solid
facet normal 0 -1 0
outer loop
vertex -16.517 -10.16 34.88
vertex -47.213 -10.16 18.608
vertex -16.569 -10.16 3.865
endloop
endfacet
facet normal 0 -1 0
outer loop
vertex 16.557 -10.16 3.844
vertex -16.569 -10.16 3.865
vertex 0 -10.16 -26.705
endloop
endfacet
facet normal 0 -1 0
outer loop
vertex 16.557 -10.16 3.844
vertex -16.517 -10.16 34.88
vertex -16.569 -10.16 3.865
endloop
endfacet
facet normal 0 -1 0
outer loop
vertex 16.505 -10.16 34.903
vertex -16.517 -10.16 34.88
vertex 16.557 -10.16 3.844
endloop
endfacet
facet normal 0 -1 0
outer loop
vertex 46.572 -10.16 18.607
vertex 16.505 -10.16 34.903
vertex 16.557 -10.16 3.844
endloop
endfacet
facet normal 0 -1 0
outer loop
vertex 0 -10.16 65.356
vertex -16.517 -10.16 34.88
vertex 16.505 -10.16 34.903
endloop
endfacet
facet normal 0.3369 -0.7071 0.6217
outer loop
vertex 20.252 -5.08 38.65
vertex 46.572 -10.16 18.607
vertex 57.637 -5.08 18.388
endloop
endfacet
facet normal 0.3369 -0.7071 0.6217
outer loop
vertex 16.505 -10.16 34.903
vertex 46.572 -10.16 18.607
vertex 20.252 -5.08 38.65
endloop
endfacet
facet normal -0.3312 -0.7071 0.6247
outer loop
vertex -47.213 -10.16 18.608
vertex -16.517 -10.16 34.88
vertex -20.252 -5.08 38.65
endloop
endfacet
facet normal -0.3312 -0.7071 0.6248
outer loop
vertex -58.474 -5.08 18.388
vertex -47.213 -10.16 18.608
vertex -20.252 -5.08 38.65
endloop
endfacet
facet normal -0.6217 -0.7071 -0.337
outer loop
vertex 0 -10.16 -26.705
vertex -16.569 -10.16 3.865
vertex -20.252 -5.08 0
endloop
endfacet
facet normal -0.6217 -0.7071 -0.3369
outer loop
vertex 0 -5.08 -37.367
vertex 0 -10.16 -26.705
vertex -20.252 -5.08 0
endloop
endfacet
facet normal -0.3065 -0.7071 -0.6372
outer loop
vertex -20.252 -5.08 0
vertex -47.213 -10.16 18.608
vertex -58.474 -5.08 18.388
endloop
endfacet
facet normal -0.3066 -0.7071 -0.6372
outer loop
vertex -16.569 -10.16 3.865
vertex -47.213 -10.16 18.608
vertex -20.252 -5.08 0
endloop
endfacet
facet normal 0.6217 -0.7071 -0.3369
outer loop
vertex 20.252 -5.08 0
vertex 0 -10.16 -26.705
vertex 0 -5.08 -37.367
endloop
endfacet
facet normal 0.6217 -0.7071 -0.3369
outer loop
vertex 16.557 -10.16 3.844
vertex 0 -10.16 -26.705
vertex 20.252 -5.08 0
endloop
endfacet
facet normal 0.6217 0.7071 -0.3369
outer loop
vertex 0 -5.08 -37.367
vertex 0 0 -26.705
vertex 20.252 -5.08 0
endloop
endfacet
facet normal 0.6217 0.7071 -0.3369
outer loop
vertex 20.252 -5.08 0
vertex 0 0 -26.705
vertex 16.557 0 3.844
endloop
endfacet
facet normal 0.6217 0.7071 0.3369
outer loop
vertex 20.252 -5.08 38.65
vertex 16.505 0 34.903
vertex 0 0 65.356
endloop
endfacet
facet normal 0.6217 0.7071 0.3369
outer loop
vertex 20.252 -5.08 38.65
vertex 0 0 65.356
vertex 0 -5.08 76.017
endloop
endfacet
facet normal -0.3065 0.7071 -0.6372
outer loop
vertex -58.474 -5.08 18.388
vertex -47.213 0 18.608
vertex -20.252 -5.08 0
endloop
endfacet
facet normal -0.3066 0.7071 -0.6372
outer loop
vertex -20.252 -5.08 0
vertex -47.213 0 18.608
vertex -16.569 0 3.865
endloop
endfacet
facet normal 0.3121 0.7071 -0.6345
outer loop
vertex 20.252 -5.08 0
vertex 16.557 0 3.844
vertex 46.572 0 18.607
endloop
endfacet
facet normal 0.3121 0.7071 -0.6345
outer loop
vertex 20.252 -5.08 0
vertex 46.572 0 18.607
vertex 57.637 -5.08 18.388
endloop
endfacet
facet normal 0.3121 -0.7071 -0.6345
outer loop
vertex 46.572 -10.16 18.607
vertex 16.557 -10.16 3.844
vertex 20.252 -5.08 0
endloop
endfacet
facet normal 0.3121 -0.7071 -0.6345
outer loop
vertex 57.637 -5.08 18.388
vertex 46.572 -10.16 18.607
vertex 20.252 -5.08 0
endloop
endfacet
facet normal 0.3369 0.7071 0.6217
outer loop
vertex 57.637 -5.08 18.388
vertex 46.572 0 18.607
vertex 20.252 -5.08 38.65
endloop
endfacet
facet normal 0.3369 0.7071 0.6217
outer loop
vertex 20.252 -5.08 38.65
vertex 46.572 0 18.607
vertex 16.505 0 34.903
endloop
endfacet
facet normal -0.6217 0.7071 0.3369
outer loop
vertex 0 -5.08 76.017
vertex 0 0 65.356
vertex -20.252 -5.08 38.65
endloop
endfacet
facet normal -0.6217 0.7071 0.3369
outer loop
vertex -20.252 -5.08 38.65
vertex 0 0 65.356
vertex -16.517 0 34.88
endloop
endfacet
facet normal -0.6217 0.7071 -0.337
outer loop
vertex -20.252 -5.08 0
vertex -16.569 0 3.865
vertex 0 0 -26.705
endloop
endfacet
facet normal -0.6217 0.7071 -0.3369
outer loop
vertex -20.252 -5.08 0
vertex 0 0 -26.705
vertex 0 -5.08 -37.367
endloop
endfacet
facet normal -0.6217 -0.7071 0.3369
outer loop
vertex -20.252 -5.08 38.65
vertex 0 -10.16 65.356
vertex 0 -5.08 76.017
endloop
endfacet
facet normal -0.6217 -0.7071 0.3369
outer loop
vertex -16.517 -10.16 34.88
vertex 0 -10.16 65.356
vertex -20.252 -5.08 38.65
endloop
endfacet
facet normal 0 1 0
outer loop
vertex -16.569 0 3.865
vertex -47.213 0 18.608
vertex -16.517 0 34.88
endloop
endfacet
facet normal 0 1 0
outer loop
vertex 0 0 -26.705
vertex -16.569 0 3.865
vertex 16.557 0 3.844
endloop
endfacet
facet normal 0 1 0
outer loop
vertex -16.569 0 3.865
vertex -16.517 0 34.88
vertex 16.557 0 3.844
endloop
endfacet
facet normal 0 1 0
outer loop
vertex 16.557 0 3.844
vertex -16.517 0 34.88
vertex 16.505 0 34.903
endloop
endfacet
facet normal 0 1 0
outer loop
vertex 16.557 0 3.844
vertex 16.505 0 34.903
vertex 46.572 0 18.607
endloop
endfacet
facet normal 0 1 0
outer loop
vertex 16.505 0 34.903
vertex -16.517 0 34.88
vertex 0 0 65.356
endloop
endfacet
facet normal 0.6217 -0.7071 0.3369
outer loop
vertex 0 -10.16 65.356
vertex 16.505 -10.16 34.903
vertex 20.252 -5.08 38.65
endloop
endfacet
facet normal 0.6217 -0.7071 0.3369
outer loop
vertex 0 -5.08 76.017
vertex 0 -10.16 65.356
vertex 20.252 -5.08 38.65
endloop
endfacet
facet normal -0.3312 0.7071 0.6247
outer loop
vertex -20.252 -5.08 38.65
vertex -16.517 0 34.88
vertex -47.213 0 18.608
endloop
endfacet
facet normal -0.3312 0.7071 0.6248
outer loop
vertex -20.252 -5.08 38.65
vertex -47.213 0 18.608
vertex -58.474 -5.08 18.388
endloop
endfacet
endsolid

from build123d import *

# Parameters (mm, degrees)
F1_DEPTH = 10.16
F2_SIZE  = 5.07999


# Not quite as in the source:
# - a fillet or chamfer is up to 0.001 mm smaller than in the source, because OpenCascade refuses the exact size


with BuildPart() as f1:
    # F0 (on Front) → F1 (new body)
    with BuildSketch(Plane.XZ):
        Polygon((20.2520862222, 38.6501066387), (0, 76.0166272521), (-20.2520843595, 38.6501066387), (-58.4743283689, 18.3879856241), (-20.2520843595, 0), (0, -37.3665240501), (20.2520862222, 0), (57.6371251704, 18.3879856241), align=None)
    extrude(amount=F1_DEPTH)

    # F2 (size 5.08 in the source; OpenCascade refuses exactly that, so slightly less here)
    f2_edges = [f1.edges().sort_by_distance(p)[0] for p in [
        (-39.363206, -10.16, 28.519046),
        (-10.126042, -10.16, 57.333367),
        (10.126043, -10.16, 57.333367),
        (38.944606, -10.16, 28.519046),
        (38.944606, -10.16, 9.193993),
        (10.126043, -10.16, -18.683262),
        (-10.126042, -10.16, -18.683262),
        (-39.363206, -10.16, 9.193993),
        (10.126043, 0, 57.333367),
        (-10.126042, 0, 57.333367),
        (-39.363206, 0, 28.519046),
        (-39.363206, 0, 9.193993),
        (-10.126042, 0, -18.683262),
        (10.126043, 0, -18.683262),
        (38.944606, 0, 9.193993),
        (38.944606, 0, 28.519046),
    ]]
    chamfer(f2_edges, length=F2_SIZE)


solid = f1.part
